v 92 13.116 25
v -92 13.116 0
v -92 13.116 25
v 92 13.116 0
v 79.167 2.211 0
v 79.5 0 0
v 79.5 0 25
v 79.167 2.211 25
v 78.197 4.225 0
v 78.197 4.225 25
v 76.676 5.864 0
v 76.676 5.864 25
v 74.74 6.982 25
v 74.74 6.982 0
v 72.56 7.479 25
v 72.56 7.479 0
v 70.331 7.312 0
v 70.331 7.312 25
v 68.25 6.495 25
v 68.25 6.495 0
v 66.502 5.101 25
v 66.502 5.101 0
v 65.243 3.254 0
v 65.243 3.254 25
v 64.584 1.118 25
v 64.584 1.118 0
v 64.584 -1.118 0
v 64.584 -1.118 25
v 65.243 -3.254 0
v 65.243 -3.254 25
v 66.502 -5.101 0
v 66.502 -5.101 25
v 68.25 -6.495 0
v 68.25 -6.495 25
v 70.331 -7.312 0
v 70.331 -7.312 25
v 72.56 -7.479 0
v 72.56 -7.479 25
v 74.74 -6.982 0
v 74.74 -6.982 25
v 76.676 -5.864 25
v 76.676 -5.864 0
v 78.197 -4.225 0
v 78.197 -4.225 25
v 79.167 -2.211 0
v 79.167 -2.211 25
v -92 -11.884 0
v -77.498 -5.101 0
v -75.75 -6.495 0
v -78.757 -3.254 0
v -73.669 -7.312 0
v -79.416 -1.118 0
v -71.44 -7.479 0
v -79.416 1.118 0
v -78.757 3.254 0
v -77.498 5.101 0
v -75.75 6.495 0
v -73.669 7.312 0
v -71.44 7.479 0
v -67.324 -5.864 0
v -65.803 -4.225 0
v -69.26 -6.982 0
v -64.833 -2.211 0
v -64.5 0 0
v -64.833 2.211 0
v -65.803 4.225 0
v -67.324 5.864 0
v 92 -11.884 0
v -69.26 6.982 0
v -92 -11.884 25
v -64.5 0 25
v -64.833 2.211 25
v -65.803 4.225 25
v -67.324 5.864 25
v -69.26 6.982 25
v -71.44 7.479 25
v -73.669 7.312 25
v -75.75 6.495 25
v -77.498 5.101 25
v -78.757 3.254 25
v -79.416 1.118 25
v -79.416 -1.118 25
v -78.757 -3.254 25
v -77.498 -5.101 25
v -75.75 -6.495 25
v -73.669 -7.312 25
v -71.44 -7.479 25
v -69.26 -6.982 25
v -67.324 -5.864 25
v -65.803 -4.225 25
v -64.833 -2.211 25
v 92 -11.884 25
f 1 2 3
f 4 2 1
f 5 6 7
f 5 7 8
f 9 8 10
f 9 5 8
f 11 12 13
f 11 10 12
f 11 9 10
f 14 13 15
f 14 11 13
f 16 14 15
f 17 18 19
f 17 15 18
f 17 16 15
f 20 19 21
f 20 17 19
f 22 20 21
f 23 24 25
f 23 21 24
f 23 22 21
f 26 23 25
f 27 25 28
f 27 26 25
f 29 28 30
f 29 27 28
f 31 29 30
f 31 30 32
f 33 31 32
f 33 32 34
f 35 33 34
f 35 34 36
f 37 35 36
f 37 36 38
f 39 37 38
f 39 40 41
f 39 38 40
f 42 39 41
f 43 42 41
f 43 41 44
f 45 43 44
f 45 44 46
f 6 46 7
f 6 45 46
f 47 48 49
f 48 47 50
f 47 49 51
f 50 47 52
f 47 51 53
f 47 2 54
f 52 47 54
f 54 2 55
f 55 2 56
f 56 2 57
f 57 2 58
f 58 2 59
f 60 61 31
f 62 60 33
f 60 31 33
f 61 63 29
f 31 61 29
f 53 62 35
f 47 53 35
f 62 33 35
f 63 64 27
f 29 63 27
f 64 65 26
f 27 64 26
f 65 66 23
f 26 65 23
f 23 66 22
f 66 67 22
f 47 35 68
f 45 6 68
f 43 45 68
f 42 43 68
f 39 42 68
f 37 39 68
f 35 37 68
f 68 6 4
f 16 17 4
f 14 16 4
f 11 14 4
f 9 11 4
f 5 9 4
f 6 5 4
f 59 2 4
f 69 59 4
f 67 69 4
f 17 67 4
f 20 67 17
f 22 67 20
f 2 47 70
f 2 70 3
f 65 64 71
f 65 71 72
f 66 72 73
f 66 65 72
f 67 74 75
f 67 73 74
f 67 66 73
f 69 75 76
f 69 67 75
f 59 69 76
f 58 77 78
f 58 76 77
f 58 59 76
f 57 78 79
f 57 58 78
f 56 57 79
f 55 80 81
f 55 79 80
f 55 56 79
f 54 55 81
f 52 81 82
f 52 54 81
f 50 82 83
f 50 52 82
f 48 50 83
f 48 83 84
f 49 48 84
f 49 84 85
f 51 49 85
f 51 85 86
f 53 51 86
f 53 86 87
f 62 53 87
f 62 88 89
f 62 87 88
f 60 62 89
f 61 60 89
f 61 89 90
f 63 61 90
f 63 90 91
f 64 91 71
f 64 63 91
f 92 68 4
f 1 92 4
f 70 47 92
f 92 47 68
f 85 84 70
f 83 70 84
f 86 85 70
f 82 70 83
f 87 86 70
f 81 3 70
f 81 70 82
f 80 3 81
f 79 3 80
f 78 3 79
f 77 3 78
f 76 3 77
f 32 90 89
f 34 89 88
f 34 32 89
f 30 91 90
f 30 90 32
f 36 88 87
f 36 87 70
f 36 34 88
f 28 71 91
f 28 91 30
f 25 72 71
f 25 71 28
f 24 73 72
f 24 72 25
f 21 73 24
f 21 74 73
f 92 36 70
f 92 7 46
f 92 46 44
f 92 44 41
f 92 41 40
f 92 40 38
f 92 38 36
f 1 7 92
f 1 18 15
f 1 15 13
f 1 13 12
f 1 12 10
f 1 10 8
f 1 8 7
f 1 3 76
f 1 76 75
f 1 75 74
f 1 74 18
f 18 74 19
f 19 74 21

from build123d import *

# Parameters (mm, degrees)
SKETCH1_W               = 184
SKETCH1_H               = 25
BOSS_EXTRUDE1_DEPTH     = 25
CUT_EXTRUDE1_DEPTH      = 97.234200727
CUT_EXTRUDE1_DEPTH_BACK = 97.234200727
SKETCH2_R               = 7.5


with BuildPart() as part:
    # Sketch1 → Boss-Extrude1 (new body)
    with BuildSketch(Plane.XY):
        with Locations((0, 0.615692496)):
            Rectangle(SKETCH1_W, SKETCH1_H)
    extrude(amount=BOSS_EXTRUDE1_DEPTH)

    # Sketch2 → Cut-Extrude1 (cut, two sides: drawn at the far end of the back side and taken through both)
    with BuildSketch(Plane.XY.offset(25).offset(-CUT_EXTRUDE1_DEPTH_BACK)):
        with Locations((-72, 0)):
            Circle(SKETCH2_R)
        with Locations((72, 0)):
            Circle(SKETCH2_R)
    extrude(amount=CUT_EXTRUDE1_DEPTH + CUT_EXTRUDE1_DEPTH_BACK, mode=Mode.SUBTRACT)


solid = part.part
